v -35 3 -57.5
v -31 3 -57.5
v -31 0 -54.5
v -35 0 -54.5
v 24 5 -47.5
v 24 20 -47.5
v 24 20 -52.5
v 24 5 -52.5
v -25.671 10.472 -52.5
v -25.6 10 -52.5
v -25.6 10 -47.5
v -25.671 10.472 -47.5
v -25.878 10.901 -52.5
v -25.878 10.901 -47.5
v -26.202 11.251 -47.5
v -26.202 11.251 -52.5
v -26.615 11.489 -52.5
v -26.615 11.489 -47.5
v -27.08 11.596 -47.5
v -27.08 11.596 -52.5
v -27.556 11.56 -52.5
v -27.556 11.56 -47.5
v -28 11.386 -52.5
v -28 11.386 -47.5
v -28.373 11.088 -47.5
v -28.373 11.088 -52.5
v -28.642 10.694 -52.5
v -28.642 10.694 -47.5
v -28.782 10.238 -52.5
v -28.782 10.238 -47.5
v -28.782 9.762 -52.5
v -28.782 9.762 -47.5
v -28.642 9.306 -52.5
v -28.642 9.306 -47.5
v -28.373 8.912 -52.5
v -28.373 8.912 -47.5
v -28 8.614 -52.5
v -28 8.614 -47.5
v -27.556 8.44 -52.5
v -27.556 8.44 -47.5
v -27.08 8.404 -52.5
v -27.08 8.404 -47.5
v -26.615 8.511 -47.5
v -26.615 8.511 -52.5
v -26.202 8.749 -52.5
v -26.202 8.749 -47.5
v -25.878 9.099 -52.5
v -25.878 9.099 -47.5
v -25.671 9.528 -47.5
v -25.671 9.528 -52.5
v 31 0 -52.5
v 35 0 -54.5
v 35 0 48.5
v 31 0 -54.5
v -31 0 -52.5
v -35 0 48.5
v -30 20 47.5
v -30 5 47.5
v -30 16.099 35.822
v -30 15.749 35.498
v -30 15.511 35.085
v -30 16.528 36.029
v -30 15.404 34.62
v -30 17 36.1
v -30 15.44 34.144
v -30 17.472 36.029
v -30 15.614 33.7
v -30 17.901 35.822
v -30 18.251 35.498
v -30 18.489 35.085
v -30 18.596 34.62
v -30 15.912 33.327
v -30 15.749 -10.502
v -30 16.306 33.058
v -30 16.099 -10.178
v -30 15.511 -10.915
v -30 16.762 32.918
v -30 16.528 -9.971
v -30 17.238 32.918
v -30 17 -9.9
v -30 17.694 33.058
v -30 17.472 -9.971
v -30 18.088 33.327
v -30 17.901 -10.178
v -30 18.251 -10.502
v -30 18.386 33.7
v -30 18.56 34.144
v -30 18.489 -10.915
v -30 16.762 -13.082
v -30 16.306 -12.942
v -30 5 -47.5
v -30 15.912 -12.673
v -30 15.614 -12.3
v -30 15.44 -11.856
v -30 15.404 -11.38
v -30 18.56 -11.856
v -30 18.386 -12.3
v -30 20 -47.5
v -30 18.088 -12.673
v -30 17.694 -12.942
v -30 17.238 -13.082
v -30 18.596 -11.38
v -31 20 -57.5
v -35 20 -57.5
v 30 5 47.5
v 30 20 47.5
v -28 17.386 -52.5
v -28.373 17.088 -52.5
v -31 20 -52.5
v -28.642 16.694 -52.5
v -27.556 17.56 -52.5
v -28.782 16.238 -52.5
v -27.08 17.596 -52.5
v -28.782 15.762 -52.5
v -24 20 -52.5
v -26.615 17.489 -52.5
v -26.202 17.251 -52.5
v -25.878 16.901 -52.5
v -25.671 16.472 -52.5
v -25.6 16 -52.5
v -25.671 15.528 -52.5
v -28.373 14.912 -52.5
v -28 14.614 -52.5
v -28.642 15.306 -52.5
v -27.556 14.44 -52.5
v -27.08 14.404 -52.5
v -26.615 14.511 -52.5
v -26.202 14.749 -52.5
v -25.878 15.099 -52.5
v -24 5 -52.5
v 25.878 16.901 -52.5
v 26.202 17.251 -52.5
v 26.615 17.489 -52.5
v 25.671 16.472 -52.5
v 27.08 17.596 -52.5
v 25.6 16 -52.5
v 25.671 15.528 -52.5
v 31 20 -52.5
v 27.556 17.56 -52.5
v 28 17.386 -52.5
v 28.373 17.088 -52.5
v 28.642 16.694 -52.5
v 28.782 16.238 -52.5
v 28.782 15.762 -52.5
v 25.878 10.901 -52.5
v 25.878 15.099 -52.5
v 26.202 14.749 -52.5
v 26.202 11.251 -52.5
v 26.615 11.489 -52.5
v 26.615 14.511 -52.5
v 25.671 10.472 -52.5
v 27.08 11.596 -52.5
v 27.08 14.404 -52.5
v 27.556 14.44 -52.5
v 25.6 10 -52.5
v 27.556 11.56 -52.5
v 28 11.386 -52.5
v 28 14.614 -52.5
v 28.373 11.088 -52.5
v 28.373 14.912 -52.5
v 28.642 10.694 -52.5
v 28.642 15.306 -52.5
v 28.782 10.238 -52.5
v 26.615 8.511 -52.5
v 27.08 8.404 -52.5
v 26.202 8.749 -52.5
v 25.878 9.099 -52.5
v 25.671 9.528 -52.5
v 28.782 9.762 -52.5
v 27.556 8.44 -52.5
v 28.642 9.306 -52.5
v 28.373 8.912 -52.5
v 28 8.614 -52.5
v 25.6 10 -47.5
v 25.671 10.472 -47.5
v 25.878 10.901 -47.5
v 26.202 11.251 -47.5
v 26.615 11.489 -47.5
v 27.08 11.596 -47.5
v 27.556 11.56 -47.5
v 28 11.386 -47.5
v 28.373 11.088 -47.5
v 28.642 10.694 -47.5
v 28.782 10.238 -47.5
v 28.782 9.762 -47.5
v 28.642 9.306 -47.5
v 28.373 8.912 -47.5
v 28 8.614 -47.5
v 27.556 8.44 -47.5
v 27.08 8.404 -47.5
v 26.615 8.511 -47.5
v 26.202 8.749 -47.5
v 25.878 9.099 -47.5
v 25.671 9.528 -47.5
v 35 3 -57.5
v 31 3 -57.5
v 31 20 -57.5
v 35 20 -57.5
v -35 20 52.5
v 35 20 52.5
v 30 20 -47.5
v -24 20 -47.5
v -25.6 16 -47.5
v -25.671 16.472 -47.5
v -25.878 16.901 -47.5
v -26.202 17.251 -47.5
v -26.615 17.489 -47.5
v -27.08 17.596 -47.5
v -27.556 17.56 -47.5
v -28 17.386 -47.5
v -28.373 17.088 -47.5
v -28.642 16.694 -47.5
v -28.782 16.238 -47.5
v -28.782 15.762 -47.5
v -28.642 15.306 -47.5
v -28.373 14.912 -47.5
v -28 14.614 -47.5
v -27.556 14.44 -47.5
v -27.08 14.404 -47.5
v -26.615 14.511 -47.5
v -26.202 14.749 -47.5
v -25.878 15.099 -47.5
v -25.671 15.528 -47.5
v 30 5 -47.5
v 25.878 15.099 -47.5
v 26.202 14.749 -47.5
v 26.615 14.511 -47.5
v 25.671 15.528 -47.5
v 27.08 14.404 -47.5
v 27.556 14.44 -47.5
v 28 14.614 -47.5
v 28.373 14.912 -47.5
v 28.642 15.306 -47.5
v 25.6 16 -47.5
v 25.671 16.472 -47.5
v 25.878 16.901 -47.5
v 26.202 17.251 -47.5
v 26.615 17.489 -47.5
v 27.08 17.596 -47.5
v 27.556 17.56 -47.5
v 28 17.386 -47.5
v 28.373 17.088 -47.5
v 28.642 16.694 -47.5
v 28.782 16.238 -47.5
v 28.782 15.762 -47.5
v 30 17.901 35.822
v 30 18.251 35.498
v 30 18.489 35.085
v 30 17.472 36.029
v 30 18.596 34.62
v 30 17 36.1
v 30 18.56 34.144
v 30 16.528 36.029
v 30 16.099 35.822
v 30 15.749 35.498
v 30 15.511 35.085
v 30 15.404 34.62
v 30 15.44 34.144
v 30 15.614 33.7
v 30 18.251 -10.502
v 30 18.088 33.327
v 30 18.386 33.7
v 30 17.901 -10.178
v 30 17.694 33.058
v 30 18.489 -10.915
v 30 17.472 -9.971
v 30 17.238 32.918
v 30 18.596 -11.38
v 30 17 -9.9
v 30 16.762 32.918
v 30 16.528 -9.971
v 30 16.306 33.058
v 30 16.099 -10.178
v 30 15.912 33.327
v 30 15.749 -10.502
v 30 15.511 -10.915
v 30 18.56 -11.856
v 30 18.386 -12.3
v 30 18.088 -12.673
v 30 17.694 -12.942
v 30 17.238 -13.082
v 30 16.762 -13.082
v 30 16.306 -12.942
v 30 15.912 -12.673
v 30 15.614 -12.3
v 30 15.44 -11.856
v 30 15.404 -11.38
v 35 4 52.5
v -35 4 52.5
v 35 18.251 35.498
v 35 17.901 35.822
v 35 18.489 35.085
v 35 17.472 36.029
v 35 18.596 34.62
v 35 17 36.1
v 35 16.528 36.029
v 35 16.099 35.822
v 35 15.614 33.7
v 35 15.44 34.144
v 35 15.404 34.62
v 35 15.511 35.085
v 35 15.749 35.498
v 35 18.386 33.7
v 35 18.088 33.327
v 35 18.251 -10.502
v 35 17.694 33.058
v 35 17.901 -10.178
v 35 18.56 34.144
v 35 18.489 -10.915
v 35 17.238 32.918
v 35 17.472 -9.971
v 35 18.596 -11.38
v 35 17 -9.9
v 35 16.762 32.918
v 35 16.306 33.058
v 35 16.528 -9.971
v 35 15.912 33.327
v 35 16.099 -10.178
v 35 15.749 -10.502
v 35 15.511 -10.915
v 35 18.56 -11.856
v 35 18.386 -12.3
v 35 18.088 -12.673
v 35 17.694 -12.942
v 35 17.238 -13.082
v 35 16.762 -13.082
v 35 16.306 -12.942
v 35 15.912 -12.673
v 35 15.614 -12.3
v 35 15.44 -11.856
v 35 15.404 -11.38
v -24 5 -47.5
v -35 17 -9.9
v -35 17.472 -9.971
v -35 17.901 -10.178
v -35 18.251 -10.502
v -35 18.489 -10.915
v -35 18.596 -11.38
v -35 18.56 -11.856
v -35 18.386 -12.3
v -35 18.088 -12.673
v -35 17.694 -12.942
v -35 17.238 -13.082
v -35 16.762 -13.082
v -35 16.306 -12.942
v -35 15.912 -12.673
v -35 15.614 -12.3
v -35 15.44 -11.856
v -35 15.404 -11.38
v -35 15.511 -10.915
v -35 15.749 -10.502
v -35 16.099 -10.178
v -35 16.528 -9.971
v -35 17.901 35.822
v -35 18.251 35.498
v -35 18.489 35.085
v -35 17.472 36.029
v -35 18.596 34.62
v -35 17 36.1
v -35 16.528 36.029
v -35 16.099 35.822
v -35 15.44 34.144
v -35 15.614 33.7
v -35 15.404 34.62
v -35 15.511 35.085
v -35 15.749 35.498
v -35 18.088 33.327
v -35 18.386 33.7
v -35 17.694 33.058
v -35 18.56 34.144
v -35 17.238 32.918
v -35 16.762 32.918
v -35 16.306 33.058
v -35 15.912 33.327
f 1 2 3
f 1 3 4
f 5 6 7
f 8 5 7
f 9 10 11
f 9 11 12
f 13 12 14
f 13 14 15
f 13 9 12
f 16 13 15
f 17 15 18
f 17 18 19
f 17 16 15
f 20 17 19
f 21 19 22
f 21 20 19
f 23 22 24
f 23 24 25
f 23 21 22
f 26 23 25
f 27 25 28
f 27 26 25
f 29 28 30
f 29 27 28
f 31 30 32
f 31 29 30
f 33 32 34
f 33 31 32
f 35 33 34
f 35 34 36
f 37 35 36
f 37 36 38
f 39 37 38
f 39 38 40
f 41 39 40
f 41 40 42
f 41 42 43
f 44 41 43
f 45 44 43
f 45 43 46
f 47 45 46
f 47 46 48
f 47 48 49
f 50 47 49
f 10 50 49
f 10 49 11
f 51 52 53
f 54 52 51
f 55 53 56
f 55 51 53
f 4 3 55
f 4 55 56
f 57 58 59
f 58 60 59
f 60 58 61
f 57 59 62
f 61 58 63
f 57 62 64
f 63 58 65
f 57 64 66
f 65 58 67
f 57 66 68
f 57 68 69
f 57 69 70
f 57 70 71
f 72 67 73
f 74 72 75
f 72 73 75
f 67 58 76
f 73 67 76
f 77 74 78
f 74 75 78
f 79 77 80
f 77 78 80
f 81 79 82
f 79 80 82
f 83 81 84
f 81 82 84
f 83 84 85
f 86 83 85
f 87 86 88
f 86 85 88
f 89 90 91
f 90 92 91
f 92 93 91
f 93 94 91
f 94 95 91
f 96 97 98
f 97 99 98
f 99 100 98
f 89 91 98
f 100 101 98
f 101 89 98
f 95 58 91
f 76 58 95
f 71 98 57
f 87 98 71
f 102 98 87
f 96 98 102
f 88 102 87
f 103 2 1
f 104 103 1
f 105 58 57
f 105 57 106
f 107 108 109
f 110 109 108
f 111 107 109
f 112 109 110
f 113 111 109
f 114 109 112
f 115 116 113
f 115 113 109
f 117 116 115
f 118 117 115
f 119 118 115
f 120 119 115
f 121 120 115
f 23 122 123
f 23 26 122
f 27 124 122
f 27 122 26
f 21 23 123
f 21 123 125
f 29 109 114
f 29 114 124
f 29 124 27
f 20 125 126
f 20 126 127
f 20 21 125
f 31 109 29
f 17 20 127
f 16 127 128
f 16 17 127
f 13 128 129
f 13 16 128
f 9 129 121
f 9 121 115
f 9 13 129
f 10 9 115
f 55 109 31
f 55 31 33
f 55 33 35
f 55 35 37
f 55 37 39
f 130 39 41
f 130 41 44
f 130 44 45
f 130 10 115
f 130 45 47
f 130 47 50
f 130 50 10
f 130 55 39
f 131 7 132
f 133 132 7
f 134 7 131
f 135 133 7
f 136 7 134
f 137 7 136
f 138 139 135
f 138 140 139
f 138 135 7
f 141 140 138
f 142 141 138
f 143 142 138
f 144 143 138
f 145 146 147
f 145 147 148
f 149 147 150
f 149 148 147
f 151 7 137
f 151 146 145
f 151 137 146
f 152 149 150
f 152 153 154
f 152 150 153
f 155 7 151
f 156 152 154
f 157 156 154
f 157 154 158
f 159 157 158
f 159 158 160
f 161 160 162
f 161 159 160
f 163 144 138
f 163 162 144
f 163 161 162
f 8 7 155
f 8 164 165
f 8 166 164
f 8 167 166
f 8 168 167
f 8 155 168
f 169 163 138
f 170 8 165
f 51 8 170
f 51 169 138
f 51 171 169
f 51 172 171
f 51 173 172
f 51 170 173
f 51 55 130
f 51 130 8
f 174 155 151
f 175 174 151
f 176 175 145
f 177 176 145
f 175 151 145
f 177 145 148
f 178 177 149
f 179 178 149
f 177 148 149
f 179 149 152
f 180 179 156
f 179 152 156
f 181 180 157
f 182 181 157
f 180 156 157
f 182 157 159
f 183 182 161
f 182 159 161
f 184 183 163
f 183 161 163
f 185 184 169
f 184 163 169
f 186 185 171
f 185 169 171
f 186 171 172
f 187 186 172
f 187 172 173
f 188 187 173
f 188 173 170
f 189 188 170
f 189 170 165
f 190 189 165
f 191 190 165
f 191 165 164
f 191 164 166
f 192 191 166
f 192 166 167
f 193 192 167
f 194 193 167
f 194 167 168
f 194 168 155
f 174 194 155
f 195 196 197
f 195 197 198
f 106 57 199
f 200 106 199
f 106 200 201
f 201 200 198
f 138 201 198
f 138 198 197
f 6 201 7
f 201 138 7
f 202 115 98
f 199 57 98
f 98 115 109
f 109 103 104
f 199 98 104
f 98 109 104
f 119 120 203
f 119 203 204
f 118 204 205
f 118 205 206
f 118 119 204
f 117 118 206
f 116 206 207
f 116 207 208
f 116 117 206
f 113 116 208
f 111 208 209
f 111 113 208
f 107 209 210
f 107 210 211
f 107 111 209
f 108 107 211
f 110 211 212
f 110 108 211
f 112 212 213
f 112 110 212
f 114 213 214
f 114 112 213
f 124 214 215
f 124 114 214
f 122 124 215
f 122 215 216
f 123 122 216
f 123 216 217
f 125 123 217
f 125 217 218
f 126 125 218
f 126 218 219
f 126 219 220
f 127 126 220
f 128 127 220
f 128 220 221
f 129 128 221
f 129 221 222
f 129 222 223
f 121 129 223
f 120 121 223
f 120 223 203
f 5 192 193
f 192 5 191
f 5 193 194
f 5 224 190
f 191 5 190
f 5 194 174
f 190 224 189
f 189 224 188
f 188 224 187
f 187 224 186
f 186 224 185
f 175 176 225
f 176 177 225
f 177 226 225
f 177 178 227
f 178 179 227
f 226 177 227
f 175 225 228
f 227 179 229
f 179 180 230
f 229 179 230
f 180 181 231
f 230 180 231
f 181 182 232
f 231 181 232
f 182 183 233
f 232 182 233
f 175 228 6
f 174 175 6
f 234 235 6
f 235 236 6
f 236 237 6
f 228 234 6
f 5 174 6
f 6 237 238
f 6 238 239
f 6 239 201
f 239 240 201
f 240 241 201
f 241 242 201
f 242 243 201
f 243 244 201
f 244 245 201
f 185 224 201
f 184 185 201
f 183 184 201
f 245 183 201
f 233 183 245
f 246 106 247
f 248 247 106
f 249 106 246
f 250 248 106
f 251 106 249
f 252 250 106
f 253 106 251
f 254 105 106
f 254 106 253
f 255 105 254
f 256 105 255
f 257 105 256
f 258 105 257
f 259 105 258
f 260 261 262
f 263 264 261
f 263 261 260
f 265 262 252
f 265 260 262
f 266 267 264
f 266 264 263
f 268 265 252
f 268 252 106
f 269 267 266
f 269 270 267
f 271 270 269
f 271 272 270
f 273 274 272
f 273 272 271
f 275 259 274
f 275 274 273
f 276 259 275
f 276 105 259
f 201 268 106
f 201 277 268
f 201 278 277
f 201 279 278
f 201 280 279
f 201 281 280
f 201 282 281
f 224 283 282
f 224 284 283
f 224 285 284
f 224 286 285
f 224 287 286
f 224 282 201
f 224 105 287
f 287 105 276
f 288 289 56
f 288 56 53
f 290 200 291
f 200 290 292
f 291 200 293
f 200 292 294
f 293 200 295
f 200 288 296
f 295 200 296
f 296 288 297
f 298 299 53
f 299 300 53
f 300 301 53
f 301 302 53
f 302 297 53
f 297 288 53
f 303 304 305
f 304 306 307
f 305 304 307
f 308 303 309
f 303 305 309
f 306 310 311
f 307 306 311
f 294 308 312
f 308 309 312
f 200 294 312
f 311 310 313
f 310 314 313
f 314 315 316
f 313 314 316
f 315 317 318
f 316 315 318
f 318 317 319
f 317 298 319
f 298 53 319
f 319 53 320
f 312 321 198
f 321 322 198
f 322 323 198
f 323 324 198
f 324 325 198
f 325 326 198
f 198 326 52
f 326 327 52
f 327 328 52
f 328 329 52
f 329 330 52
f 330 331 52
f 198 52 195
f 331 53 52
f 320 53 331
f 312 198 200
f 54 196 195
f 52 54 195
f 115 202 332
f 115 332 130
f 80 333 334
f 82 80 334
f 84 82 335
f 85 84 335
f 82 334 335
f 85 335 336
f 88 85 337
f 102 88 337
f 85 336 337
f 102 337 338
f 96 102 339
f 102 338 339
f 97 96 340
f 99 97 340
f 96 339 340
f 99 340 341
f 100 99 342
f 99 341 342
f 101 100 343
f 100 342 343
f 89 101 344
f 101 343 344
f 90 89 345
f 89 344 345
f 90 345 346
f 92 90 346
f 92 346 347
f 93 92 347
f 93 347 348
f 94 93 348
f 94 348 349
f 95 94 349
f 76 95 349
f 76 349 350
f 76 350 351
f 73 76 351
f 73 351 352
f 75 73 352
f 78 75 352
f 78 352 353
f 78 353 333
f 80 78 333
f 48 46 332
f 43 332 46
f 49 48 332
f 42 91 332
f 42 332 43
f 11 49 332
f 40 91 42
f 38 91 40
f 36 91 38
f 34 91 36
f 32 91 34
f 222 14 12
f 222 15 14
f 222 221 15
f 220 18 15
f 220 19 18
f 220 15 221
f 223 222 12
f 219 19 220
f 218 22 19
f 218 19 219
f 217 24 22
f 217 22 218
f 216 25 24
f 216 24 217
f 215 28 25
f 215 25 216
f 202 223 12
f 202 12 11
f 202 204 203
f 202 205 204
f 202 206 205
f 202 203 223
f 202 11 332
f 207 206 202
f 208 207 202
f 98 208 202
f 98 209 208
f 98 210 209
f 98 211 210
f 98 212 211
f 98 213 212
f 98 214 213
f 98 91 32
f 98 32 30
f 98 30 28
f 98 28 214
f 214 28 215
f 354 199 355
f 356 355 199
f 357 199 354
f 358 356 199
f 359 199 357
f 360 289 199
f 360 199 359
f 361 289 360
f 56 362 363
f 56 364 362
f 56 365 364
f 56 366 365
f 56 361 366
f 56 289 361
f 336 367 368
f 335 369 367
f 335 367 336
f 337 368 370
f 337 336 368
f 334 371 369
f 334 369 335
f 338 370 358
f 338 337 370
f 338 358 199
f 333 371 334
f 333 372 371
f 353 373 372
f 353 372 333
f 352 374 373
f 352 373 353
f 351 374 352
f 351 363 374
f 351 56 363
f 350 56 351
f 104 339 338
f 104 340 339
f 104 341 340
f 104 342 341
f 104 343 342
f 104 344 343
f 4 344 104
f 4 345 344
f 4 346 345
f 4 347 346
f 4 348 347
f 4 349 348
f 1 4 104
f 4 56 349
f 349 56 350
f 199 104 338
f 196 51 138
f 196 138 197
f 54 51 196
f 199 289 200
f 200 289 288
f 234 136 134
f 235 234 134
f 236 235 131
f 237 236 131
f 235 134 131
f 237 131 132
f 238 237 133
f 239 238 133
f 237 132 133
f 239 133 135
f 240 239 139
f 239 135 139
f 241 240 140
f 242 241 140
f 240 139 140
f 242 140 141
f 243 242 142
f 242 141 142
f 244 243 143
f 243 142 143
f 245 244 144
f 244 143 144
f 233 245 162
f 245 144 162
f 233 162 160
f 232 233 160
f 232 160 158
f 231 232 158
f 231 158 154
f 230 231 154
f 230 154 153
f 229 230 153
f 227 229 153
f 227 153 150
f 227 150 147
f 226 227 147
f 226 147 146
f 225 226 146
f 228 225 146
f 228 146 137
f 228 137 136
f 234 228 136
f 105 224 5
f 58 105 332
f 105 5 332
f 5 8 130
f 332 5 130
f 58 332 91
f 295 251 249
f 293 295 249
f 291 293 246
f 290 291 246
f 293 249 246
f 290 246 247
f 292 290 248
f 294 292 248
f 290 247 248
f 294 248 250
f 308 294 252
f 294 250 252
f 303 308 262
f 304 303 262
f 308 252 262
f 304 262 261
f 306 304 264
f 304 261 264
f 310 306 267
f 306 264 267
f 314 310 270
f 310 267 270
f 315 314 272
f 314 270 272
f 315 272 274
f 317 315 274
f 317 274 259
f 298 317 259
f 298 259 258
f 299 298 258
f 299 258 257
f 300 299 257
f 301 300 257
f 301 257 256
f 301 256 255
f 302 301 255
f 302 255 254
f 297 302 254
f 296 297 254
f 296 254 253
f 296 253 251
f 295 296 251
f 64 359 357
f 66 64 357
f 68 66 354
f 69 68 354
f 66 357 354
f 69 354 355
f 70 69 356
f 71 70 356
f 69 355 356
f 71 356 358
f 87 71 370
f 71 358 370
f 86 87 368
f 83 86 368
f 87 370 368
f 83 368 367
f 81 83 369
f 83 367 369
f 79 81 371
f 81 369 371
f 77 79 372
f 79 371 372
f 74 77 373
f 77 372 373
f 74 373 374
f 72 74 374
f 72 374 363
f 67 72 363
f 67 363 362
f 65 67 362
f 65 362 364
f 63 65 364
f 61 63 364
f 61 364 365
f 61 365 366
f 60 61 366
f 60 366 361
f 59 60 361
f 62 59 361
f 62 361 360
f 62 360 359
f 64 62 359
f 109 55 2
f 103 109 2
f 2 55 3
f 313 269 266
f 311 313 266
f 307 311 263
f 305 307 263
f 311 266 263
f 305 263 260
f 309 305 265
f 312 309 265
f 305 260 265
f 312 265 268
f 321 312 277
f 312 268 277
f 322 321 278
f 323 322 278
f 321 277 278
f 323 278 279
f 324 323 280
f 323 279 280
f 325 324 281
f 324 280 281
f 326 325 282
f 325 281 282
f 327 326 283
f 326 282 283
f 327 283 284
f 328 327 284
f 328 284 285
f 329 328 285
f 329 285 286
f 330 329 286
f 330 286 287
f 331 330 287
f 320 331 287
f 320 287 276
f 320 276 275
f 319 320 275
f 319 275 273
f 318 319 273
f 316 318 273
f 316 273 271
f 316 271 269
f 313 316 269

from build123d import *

# Parameters (mm, degrees)
CROQUIS1_W                 = 70
CROQUIS1_H                 = 105
SALIENTE_EXTRUIR1_DEPTH    = 20
VACIADO1_T                 = -5
CROQUIS3_R                 = 1.6
CORTAR_EXTRUIR1_DEPTH      = 70
CROQUIS4_W                 = 60
CROQUIS4_H                 = 15
CORTAR_EXTRUIR2_DEPTH      = 5
CROQUIS5_W                 = 5
CROQUIS5_H                 = 15
SALIENTE_EXTRUIR2_DEPTH    = 6
CORTAR_EXTRUIR3_REACH      = 114.472
CROQUIS6_R                 = 1.6
CROQUIS7_W                 = 4
CROQUIS7_H                 = 5
SALIENTE_EXTRUIR3_DEPTH    = 20
CHAFL_N1_SIZE              = 3
CHAFL_N1_OF_SIMETR_A3_SIZE = 3
CHAFL_N2_SIZE              = 4


with BuildPart() as part:
    # Croquis1 → Saliente-Extruir1 (new body)
    with BuildSketch(Plane(origin=(0, 0, 0), x_dir=(1, 0, 0), z_dir=(0, 1, 0))):
        Rectangle(CROQUIS1_W, CROQUIS1_H)
    extrude(amount=SALIENTE_EXTRUIR1_DEPTH)

    # Vaciado1
    vaciado1_openings = [part.faces().sort_by_distance(p)[0] for p in [
        (0, 20, 0),
    ]]
    offset(amount=VACIADO1_T, openings=vaciado1_openings, kind=Kind.INTERSECTION)

    # Croquis3 → Cortar-Extruir1 (cut)
    with BuildSketch(Plane.ZY.offset(35)):
        with Locations((34.5, 17)):
            Circle(CROQUIS3_R)
        with Locations((-11.5, 17)):
            Circle(CROQUIS3_R)
    extrude(amount=-CORTAR_EXTRUIR1_DEPTH, mode=Mode.SUBTRACT)

    # Croquis4 → Cortar-Extruir2 (cut)
    with BuildSketch(Plane(origin=(0, 0, -52.5), x_dir=(-1, 0, 0), z_dir=(0, 0, -1))):
        with Locations((0, 12.5)):
            Rectangle(CROQUIS4_W, CROQUIS4_H)
    extrude(amount=-CORTAR_EXTRUIR2_DEPTH, mode=Mode.SUBTRACT)

    # Croquis5 → Saliente-Extruir2 (add)
    with BuildSketch(Plane(origin=(-30, 0, 0), x_dir=(0, 0, -1), z_dir=(1, 0, 0))):
        with Locations((50, 12.5)):
            Rectangle(CROQUIS5_W, CROQUIS5_H)
    saliente_extruir2 = extrude(amount=SALIENTE_EXTRUIR2_DEPTH)

    # Simetría1: Saliente-Extruir2 across plane
    add(saliente_extruir2.mirror(Plane(origin=(0, 0, 0), x_dir=(0, 0, 1), z_dir=(1, 0, 0))))

    # Croquis6 → Cortar-Extruir3 (cut, up to next)
    with BuildSketch(Plane(origin=(0, 0, -52.5), x_dir=(-1, 0, 0), z_dir=(0, 0, -1)), mode=Mode.PRIVATE) as cortar_extruir3_sk1:
        with Locations((-27.2, 16)):
            Circle(CROQUIS6_R)
    cortar_extruir3_tool1 = extrude(cortar_extruir3_sk1.sketch, amount=-CORTAR_EXTRUIR3_REACH, mode=Mode.PRIVATE) & part.part
    # Croquis6 → Cortar-Extruir3 (cut, up to next)
    with BuildSketch(Plane(origin=(0, 0, -52.5), x_dir=(-1, 0, 0), z_dir=(0, 0, -1)), mode=Mode.PRIVATE) as cortar_extruir3_sk2:
        with Locations((-27.2, 10)):
            Circle(CROQUIS6_R)
    cortar_extruir3_tool2 = extrude(cortar_extruir3_sk2.sketch, amount=-CORTAR_EXTRUIR3_REACH, mode=Mode.PRIVATE) & part.part
    cortar_extruir3_1 = cortar_extruir3_tool1.solids().sort_by_distance((27.2, 16, -52.5))[0]
    add(cortar_extruir3_1, mode=Mode.SUBTRACT)
    cortar_extruir3_2 = cortar_extruir3_tool2.solids().sort_by_distance((27.2, 10, -52.5))[0]
    add(cortar_extruir3_2, mode=Mode.SUBTRACT)
    cortar_extruir3 = cortar_extruir3_1 + cortar_extruir3_2  # Cortar-Extruir3 as one shape, for the pattern or mirror that repeats it

    # Simetría2: Cortar-Extruir3 across plane
    add(cortar_extruir3.mirror(Plane(origin=(0, 0, 0), x_dir=(0, 0, 1), z_dir=(1, 0, 0))), mode=Mode.SUBTRACT)

    # Croquis7 → Saliente-Extruir3 (add)
    with BuildSketch(Plane(origin=(0, 0, 0), x_dir=(1, 0, 0), z_dir=(0, 1, 0))):
        with Locations((33, 55)):
            Rectangle(CROQUIS7_W, CROQUIS7_H)
    saliente_extruir3 = extrude(amount=SALIENTE_EXTRUIR3_DEPTH)

    # Chaflán1
    chafl_n1_edges = [part.edges().sort_by_distance(p)[0] for p in [
        (33, 0, -57.5),
    ]]
    chamfer(chafl_n1_edges, length=CHAFL_N1_SIZE)

    # Simetría3: Saliente-Extruir3 across plane
    add(saliente_extruir3.mirror(Plane(origin=(0, 0, 0), x_dir=(0, 0, 1), z_dir=(1, 0, 0))))

    # Chaflán1 of Simetría3
    chafl_n1_of_simetr_a3_edges = [part.edges().sort_by_distance(p)[0] for p in [
        (-33, 0, -57.5),
    ]]
    chamfer(chafl_n1_of_simetr_a3_edges, length=CHAFL_N1_OF_SIMETR_A3_SIZE)

    # Chaflán2
    chafl_n2_edges = [part.edges().sort_by_distance(p)[0] for p in [
        (0, 0, 52.5),
    ]]
    chamfer(chafl_n2_edges, length=CHAFL_N2_SIZE)


solid = part.part
